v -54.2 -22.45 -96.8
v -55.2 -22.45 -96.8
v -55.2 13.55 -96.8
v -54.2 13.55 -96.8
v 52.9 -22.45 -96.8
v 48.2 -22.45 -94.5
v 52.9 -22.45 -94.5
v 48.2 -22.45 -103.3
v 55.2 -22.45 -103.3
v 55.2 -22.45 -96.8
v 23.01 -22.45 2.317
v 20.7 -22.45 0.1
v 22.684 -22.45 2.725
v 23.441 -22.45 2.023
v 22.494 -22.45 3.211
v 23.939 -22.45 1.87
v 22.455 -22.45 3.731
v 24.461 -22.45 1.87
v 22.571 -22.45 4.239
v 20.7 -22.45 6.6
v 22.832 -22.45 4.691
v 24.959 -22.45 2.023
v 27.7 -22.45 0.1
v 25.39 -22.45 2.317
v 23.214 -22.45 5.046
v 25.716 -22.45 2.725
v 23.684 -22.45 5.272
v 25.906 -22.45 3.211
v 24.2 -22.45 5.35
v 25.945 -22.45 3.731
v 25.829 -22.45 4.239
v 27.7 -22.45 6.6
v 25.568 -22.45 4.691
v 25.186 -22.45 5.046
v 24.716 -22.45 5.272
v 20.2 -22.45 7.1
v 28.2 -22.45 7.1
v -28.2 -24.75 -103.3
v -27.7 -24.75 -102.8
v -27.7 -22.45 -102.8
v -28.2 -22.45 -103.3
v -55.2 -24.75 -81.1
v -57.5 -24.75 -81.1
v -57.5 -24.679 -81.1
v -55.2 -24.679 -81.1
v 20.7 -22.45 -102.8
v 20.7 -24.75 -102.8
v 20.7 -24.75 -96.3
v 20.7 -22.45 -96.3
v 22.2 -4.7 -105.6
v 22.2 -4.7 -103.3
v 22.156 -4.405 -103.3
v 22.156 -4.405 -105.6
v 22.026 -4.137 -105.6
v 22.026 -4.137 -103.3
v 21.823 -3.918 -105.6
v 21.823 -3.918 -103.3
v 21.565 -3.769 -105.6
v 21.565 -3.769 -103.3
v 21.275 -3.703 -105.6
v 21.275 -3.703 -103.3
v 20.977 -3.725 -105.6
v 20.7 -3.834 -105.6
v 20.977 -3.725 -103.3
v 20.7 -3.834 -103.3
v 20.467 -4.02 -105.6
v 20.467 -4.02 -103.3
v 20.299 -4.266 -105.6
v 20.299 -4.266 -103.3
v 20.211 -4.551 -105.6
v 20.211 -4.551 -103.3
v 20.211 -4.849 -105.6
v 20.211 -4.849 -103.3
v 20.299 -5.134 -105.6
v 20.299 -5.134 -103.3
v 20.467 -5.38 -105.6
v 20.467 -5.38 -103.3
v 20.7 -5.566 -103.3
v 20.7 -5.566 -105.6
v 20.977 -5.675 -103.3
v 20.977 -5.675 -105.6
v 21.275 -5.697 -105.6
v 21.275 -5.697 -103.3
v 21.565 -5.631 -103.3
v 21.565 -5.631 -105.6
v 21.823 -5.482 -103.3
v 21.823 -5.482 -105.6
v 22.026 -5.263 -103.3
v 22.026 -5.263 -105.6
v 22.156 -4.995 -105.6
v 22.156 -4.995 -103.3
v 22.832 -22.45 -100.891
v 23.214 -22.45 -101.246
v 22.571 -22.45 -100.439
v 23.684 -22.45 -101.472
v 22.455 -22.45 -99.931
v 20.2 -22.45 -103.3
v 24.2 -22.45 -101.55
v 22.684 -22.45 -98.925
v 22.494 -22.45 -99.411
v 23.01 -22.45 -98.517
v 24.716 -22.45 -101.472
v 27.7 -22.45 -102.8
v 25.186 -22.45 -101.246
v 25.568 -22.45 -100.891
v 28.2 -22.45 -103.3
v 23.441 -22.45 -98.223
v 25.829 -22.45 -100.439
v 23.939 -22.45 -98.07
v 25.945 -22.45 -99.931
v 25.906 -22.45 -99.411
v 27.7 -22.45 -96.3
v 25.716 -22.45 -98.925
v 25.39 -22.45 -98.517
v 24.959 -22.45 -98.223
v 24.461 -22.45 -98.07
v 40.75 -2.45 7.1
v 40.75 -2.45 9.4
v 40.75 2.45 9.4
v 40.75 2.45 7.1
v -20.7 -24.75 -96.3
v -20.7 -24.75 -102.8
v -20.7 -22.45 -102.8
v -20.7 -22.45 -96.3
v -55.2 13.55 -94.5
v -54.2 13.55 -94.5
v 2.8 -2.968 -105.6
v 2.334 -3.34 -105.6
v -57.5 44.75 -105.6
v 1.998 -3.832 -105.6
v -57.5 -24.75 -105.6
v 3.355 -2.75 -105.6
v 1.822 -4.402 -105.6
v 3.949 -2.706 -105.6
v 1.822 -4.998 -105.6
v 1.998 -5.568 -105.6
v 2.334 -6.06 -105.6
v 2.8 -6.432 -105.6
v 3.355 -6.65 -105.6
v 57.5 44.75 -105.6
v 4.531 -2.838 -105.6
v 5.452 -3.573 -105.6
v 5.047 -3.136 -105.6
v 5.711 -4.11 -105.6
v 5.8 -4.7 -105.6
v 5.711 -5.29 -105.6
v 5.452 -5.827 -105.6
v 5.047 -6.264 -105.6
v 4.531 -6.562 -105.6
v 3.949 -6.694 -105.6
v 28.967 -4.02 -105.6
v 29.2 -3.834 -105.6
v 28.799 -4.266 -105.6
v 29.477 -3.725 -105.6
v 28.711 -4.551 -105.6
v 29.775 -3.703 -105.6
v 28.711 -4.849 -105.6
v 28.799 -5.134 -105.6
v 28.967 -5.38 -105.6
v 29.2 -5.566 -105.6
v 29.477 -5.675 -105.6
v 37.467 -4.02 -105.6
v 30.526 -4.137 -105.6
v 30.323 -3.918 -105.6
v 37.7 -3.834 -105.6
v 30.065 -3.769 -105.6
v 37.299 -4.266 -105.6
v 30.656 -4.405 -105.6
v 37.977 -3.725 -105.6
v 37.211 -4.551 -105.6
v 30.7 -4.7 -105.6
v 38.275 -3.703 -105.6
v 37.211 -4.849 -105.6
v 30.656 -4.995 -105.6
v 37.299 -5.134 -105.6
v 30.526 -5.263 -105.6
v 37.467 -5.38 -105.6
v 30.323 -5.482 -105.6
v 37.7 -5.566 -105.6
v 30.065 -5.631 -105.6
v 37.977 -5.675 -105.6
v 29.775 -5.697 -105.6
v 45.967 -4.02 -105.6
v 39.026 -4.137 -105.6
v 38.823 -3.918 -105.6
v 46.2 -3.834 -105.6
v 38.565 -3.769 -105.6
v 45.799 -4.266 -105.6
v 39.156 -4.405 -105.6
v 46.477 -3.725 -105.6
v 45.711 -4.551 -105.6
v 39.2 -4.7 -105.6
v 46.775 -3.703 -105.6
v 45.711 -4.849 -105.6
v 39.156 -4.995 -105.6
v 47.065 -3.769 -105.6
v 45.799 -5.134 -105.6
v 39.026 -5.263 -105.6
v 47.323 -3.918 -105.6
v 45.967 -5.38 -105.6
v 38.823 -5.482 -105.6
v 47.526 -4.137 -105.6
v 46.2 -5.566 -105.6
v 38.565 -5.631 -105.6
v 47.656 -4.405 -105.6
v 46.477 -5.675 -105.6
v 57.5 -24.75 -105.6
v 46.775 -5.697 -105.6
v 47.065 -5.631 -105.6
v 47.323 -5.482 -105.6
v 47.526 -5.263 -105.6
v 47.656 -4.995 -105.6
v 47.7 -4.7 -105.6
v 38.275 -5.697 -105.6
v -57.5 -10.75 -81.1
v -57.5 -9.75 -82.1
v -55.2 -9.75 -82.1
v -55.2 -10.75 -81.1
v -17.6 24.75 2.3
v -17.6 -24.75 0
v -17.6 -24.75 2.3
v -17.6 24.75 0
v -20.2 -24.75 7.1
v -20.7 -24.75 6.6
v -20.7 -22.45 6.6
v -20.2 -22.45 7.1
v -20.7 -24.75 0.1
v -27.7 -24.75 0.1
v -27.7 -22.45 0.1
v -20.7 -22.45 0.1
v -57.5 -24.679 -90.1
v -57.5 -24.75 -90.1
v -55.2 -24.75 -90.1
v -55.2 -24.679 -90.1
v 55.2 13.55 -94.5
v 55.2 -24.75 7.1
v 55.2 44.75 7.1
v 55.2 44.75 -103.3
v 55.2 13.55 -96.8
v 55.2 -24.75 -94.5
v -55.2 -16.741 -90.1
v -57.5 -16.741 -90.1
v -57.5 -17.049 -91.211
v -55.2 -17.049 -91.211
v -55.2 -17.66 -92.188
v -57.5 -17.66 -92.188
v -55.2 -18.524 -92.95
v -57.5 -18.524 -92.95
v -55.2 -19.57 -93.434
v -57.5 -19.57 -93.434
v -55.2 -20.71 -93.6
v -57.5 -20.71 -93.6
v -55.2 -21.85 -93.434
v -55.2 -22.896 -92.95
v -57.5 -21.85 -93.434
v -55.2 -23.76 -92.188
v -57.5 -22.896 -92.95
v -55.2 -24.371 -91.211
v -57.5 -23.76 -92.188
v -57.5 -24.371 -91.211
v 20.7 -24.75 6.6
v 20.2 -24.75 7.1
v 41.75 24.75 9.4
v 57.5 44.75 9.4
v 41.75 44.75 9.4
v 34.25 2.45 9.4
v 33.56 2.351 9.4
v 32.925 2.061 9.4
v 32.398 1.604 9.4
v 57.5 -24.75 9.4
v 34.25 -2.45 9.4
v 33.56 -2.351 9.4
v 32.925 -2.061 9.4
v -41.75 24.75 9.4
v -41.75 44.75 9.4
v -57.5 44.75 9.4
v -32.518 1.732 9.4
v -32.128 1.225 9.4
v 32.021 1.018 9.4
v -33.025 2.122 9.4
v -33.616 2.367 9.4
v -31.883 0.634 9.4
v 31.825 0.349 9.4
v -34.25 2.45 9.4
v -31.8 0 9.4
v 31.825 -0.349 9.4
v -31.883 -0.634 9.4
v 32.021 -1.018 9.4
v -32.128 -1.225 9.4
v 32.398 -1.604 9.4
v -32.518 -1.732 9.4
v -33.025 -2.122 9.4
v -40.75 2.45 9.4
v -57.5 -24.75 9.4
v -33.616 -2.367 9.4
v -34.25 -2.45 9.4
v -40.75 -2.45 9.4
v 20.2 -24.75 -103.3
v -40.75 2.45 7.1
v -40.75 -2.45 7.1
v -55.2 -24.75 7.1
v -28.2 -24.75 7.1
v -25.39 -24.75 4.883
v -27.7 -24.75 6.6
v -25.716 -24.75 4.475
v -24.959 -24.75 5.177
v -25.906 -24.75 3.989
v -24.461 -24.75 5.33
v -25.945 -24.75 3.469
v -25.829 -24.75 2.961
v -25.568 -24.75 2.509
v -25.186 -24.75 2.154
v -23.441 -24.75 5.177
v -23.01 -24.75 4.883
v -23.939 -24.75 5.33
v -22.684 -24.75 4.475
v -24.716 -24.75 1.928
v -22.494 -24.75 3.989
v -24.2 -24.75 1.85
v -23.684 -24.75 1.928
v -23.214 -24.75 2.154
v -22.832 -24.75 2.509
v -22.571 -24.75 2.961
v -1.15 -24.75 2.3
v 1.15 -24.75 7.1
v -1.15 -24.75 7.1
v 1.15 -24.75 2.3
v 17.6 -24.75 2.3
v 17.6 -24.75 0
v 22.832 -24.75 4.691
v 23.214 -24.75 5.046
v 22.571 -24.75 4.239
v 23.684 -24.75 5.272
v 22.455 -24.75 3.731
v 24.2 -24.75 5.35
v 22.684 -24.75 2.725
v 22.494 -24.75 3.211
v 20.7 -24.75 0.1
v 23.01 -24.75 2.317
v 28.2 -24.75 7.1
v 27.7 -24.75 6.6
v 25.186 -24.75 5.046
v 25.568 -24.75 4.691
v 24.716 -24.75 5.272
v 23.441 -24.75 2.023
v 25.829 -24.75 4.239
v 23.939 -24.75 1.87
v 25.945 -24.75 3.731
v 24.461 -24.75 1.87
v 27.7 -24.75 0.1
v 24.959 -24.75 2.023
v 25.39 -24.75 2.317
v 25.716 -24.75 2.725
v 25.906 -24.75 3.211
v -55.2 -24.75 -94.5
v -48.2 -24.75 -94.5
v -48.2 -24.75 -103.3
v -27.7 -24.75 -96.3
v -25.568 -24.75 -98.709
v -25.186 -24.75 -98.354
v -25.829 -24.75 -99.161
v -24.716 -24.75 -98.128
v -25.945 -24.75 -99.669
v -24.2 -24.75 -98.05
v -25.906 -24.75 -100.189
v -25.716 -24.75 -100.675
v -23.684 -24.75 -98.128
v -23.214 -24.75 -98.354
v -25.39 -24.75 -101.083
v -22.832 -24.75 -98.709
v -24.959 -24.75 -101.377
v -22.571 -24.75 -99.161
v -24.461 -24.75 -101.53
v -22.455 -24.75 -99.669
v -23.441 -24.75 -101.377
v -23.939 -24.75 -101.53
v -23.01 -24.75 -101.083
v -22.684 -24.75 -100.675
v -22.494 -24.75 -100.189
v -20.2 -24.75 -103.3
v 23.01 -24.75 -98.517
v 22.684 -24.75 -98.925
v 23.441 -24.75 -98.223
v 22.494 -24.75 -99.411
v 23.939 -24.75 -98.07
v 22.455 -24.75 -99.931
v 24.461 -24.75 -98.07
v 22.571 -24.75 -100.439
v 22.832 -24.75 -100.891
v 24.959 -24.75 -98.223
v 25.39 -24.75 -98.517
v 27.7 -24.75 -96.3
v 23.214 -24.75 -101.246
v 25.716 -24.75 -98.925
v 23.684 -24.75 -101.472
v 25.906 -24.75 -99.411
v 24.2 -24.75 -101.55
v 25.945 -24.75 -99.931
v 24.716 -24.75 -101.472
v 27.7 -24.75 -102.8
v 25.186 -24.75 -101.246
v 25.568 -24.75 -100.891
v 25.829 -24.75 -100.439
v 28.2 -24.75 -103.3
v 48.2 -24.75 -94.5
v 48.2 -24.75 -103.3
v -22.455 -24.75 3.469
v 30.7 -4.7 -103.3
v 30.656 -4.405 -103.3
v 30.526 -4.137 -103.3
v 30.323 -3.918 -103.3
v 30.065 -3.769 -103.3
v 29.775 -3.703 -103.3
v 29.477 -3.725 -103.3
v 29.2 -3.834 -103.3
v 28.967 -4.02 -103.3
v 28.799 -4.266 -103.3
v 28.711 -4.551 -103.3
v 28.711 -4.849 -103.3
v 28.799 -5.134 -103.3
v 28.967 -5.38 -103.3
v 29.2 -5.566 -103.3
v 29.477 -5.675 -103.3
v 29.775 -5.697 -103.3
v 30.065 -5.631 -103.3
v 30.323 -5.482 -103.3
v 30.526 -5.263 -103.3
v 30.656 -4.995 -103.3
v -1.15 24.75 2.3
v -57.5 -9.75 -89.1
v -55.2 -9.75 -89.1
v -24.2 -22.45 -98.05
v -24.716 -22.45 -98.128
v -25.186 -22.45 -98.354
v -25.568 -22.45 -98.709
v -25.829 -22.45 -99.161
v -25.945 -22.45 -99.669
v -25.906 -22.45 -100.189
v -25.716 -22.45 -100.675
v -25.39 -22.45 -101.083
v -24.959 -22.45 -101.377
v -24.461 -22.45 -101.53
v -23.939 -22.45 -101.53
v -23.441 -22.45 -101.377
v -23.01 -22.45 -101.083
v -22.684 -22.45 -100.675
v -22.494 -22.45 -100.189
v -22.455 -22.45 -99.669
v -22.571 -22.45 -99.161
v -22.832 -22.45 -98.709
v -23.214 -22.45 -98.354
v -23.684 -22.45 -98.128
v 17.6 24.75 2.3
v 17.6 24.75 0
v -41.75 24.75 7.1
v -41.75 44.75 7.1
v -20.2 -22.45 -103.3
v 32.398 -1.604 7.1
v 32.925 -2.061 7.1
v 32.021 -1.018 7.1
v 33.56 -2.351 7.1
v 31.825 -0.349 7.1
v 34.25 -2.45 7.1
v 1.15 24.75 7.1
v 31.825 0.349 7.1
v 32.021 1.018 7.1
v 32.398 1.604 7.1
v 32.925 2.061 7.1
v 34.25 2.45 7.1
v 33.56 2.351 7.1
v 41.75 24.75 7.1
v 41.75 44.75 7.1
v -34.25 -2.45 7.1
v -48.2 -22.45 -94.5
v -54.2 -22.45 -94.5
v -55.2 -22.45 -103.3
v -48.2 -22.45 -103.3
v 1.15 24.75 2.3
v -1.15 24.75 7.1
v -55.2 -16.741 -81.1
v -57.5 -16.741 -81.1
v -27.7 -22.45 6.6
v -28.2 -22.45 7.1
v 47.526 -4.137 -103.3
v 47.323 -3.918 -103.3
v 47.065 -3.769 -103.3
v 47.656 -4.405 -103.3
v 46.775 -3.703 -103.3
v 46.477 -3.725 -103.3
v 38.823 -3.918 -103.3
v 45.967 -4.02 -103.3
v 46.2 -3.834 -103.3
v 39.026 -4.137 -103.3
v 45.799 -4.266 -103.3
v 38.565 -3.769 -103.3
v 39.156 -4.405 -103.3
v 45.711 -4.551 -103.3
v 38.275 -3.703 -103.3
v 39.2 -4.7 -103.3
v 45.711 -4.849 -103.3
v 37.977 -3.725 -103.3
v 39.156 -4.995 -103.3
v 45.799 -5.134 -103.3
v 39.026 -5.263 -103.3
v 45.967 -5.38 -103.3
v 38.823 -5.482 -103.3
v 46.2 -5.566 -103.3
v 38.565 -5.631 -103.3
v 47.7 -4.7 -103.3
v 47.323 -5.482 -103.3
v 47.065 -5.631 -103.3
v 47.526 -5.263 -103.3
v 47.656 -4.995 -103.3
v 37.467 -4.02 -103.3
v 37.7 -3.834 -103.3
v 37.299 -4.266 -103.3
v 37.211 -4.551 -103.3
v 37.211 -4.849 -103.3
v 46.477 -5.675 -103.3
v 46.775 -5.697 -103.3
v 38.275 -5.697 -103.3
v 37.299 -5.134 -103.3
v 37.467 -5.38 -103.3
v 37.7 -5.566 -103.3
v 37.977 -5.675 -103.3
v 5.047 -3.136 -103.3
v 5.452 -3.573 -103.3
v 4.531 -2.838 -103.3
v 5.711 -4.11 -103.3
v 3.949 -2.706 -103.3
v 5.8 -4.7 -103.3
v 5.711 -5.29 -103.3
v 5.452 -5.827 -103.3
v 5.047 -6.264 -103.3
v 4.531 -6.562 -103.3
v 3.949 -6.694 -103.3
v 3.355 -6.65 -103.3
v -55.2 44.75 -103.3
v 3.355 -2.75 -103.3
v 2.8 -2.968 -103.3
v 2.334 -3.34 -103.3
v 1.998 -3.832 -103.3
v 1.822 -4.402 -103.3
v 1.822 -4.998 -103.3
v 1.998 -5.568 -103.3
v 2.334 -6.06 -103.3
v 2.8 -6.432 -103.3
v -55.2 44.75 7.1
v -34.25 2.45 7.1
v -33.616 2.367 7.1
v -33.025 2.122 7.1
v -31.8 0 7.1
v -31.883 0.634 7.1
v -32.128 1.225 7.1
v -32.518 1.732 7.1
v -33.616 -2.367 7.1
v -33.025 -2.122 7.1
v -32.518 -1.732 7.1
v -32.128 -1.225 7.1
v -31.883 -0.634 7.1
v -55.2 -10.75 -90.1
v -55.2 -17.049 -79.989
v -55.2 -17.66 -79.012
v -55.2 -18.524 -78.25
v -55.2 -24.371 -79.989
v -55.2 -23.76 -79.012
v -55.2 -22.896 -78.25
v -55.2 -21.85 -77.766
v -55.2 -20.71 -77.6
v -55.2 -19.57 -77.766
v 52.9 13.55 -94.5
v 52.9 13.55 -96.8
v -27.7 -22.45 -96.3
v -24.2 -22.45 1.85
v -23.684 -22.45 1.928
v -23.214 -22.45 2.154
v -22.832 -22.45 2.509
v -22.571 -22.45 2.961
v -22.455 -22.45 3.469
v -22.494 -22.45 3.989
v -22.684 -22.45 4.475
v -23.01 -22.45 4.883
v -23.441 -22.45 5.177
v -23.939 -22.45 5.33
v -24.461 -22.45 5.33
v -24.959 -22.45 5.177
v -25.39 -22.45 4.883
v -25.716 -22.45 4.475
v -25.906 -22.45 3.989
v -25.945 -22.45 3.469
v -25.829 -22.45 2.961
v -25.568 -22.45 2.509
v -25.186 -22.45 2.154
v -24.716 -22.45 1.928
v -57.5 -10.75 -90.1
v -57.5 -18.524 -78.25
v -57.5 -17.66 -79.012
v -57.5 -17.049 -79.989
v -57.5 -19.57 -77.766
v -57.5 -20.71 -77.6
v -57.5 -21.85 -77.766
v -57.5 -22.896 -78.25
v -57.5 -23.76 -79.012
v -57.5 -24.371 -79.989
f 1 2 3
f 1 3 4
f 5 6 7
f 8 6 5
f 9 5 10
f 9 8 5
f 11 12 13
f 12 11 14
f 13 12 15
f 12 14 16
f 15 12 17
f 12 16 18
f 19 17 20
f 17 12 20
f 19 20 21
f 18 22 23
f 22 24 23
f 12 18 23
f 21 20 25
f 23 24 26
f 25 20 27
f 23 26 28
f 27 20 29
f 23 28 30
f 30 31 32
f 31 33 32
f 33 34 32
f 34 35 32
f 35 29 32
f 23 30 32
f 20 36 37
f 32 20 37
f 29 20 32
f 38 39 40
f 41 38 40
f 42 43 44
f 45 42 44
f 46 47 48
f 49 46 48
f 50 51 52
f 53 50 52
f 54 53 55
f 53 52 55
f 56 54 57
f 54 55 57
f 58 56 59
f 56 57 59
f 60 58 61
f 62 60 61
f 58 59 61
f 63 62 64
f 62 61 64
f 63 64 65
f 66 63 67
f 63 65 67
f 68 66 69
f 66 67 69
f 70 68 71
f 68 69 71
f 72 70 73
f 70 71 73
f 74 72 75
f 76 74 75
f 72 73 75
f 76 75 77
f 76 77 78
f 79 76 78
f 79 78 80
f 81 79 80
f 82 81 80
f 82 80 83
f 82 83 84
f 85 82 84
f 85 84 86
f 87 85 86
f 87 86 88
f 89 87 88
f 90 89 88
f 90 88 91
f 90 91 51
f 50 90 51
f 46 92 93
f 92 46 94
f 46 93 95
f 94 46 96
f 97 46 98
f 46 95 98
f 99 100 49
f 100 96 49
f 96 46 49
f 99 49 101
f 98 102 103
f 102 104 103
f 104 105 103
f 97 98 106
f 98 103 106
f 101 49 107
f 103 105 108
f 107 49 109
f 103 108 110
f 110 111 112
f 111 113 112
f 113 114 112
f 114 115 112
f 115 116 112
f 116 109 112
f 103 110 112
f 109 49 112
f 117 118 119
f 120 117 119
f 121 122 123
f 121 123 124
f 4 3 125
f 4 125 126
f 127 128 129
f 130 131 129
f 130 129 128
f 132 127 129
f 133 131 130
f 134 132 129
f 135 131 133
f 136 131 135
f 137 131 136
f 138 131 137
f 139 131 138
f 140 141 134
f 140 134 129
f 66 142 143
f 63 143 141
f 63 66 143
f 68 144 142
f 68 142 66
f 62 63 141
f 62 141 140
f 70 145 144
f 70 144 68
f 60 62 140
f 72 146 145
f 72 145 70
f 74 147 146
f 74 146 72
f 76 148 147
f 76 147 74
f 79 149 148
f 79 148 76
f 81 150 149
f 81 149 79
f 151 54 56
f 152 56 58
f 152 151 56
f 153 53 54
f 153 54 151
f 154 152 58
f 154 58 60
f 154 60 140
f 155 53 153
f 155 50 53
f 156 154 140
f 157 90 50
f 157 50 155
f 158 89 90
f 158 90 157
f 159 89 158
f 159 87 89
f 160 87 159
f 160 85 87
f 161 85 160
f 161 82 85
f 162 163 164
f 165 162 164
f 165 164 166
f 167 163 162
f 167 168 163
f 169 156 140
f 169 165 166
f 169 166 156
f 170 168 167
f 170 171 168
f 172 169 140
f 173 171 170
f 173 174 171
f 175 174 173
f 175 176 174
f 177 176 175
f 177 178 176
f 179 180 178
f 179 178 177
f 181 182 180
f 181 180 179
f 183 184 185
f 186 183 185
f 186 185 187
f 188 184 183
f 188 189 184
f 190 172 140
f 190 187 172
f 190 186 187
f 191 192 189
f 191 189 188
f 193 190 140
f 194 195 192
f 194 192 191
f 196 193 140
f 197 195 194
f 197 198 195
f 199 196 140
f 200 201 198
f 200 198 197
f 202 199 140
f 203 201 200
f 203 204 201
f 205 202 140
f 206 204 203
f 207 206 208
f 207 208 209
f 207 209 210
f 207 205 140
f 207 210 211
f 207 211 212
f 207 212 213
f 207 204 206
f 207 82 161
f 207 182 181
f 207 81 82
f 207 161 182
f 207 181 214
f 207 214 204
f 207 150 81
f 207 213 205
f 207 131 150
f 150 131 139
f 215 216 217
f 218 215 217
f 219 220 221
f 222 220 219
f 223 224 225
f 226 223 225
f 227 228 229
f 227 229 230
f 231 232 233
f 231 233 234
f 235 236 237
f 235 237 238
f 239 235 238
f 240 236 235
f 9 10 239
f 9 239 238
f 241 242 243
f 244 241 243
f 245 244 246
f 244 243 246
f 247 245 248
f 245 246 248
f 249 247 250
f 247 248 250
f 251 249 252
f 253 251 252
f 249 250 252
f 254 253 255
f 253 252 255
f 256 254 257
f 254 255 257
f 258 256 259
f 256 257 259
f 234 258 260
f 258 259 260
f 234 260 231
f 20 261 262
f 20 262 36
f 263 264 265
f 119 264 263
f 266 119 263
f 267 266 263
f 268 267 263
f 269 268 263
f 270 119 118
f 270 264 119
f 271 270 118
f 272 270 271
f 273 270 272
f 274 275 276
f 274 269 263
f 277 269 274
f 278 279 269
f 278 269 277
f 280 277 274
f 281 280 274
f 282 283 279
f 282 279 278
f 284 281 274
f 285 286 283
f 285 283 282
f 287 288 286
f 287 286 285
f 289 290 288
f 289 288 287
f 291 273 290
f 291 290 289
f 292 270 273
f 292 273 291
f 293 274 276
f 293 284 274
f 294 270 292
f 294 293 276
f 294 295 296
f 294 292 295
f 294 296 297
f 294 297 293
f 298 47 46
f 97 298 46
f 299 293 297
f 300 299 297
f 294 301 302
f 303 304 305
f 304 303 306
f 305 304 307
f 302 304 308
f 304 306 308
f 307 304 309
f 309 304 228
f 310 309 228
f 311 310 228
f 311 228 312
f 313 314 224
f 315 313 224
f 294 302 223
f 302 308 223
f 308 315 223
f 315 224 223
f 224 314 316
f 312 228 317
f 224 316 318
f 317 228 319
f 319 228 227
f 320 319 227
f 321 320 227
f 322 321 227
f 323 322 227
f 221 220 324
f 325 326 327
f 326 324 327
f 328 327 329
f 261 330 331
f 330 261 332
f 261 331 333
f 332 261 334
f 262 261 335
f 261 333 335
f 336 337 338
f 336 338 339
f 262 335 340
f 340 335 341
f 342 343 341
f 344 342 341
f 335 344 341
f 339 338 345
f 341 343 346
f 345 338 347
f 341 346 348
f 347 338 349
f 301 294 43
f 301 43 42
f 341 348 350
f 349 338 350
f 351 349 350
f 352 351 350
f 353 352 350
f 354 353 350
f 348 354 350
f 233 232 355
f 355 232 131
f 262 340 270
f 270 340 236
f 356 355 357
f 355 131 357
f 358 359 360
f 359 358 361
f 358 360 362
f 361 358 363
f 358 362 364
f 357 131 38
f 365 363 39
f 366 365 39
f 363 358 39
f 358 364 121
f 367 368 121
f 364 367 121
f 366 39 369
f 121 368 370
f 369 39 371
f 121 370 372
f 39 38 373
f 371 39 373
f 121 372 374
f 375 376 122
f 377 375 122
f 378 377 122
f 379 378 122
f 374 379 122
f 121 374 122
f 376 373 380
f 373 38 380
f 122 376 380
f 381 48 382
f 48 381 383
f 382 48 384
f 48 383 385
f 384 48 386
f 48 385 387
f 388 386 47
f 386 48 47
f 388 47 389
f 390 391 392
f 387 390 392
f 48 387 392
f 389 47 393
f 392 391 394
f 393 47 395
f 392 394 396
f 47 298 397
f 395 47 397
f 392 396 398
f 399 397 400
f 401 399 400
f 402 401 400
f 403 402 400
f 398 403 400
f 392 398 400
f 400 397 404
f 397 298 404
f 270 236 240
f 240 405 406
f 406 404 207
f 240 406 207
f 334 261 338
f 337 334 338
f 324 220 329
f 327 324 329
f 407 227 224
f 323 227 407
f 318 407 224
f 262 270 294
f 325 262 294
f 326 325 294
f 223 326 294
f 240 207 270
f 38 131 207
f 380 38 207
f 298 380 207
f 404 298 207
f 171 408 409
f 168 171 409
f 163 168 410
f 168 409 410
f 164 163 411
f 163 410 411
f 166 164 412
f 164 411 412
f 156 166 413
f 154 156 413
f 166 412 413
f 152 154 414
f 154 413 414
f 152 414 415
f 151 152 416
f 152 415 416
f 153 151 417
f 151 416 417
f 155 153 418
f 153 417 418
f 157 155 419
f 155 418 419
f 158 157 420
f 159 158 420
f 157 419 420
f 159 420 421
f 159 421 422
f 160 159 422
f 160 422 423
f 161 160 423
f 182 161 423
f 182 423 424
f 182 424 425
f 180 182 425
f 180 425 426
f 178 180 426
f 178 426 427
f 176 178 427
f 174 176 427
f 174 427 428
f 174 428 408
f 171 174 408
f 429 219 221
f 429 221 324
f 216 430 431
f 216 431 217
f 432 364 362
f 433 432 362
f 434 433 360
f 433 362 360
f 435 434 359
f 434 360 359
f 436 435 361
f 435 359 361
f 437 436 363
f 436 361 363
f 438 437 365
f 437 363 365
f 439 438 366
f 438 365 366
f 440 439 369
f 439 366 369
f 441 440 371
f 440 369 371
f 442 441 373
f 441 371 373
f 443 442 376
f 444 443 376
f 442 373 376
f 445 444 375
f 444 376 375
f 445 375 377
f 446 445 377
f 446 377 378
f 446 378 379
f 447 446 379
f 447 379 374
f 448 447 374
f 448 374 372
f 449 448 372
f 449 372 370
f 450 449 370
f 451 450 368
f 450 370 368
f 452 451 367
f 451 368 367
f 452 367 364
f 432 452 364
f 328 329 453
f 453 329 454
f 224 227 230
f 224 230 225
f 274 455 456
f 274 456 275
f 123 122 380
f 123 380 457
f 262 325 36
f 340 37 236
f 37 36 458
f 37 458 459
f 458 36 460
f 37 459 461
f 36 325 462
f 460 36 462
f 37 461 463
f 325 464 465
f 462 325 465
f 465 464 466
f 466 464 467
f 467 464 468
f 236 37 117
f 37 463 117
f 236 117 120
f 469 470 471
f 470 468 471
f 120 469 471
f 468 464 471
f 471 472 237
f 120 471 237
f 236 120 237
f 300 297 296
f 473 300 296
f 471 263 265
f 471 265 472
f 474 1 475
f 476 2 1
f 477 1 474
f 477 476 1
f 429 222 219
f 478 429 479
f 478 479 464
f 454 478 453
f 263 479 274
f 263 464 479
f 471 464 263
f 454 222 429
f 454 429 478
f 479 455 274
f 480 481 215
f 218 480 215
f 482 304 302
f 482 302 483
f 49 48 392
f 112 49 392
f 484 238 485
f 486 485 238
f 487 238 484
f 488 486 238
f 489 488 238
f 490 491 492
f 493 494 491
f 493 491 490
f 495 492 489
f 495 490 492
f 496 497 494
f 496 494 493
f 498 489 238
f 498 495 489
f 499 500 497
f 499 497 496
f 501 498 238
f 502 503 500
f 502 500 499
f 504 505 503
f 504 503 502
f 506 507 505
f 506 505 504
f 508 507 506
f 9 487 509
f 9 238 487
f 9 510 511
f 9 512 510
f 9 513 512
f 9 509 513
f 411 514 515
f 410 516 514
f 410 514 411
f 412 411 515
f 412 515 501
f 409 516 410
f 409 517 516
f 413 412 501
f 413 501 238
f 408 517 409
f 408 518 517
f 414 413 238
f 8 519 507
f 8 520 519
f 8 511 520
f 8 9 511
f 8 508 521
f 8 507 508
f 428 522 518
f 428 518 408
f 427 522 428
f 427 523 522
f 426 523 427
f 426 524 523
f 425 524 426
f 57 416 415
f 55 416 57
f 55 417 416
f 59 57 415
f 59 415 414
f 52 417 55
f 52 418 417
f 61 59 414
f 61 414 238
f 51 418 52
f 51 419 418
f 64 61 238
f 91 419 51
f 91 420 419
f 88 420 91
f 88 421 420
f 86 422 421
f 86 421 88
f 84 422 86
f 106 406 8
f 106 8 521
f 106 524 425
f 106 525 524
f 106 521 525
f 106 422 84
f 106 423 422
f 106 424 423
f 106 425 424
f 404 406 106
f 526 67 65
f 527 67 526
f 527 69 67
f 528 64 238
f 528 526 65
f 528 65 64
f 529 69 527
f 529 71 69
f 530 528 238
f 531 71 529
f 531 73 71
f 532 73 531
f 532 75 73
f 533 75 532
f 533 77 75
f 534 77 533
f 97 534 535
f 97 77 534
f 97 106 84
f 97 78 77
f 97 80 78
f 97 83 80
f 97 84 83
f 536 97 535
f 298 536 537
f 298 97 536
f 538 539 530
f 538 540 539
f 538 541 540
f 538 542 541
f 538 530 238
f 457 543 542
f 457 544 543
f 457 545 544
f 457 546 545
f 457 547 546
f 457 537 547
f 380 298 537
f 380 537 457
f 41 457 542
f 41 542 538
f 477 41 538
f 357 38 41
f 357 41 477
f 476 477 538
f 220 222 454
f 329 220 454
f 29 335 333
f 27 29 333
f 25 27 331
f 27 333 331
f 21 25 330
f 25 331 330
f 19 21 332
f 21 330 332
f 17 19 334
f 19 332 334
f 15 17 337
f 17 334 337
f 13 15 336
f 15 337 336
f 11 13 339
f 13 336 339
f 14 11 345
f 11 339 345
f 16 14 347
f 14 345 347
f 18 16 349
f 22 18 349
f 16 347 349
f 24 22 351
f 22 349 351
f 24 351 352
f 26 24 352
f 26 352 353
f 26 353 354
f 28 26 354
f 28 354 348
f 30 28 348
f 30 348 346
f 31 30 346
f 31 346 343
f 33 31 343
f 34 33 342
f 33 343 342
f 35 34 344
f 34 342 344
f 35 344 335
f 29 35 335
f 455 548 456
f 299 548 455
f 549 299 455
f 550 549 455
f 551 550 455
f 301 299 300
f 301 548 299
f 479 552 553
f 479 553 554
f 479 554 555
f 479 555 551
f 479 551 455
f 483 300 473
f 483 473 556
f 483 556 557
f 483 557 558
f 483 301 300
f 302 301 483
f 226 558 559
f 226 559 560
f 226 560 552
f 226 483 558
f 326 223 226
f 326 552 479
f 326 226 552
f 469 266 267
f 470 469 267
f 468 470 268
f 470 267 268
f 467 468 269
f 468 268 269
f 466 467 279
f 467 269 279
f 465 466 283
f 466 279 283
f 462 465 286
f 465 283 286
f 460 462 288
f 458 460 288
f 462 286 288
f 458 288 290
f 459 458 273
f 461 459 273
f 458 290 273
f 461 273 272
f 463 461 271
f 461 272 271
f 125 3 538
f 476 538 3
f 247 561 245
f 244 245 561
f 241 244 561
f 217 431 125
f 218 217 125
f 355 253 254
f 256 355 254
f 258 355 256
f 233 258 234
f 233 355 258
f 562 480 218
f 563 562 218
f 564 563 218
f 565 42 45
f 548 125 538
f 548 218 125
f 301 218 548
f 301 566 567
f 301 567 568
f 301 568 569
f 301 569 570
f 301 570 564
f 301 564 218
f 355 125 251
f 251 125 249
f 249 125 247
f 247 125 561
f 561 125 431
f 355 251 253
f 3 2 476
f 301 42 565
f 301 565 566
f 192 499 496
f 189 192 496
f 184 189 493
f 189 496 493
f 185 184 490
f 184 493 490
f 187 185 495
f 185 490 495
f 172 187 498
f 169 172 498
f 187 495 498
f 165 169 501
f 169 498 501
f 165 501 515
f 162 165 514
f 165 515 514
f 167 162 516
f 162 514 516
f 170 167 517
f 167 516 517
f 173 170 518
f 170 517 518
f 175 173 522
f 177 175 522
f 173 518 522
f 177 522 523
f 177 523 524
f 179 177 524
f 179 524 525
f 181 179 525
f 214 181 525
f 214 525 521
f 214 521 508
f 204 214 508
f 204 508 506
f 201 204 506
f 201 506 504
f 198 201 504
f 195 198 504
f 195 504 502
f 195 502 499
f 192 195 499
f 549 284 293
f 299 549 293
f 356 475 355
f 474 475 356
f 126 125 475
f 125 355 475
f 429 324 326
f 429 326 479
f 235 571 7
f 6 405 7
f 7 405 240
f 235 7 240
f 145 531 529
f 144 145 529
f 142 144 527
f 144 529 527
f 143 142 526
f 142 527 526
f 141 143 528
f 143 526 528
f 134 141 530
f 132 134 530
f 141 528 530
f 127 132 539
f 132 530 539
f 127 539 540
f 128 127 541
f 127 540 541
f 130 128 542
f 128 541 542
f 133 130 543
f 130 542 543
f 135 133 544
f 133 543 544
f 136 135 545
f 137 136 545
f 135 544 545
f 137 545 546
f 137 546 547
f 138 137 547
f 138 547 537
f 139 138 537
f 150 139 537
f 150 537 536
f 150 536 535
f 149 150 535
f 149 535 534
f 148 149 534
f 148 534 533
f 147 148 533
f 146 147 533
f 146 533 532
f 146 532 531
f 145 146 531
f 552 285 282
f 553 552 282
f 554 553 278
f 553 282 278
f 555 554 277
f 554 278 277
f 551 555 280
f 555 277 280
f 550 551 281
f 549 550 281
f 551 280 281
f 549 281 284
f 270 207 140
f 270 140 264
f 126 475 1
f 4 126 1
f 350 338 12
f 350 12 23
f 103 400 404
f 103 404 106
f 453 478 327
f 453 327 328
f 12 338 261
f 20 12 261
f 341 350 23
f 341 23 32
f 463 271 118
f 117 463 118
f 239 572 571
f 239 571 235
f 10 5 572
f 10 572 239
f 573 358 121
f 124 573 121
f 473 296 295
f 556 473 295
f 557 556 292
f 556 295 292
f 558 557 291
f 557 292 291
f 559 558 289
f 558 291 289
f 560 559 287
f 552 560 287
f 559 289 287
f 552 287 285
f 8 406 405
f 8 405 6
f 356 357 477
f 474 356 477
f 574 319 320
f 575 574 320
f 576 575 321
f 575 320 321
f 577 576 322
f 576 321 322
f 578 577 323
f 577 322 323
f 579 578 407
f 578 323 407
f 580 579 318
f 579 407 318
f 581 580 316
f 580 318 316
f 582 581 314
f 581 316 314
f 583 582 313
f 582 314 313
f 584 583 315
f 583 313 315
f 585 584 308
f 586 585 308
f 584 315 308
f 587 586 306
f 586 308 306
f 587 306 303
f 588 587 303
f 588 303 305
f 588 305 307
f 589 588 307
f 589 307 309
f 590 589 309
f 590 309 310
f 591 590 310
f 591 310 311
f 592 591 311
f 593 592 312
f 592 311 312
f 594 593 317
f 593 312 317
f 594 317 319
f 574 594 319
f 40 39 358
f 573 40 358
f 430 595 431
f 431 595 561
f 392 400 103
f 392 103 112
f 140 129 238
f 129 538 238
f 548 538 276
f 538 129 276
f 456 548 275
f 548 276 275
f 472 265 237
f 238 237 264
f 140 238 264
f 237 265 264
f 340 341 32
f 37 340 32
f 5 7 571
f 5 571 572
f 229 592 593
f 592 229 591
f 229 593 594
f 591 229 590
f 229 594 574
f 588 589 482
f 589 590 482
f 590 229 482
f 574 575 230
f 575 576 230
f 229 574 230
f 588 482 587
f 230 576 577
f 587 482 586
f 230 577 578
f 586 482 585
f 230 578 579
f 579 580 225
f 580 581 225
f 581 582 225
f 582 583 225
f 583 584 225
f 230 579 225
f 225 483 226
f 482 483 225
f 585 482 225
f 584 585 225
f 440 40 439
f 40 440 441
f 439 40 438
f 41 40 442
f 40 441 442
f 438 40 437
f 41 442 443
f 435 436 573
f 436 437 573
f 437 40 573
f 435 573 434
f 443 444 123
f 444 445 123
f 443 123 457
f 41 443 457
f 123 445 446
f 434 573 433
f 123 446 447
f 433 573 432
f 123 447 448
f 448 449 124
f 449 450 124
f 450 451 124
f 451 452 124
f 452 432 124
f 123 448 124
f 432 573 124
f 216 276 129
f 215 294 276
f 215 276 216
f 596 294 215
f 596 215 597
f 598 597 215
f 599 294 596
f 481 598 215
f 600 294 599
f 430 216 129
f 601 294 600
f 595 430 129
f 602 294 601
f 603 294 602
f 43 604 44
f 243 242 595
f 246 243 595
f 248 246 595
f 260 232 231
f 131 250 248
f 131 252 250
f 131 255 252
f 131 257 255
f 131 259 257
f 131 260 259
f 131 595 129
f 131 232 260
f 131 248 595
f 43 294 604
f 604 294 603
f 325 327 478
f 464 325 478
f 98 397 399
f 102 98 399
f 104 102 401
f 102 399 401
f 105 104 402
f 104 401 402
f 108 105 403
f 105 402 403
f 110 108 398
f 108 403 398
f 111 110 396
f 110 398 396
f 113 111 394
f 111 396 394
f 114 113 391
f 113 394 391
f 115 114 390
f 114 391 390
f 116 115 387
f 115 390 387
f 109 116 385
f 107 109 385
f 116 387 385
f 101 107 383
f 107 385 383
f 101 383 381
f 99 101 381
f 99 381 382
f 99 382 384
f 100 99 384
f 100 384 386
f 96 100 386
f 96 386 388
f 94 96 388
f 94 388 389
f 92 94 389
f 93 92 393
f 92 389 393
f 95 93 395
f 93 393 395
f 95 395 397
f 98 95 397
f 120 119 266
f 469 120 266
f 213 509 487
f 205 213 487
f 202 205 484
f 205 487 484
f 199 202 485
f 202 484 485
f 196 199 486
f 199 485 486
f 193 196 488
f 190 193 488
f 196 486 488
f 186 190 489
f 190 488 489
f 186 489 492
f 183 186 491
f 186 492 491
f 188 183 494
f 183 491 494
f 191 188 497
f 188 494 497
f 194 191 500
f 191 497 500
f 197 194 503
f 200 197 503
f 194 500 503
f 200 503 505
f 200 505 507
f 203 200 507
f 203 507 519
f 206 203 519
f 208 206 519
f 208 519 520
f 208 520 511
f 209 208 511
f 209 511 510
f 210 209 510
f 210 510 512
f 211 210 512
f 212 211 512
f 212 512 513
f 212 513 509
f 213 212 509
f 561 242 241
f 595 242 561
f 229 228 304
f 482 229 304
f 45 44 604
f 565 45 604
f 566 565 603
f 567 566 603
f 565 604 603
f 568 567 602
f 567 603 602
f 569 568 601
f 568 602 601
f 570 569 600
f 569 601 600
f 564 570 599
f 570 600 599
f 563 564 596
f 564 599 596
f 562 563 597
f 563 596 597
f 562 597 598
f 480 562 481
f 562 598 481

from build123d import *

# Parameters (mm, degrees)
SKETCH1_W            = 35.2
SKETCH1_H            = 49.5
BOSS_EXTRUDE1_DEPTH  = 2.3
SKETCH2_W            = 2.3
SKETCH2_H            = 49.5
BOSS_EXTRUDE2_DEPTH  = 4.8
SKETCH3_W            = 83.5
SKETCH3_H            = 49.5
BOSS_EXTRUDE3_DEPTH  = 2.3
CUT_EXTRUDE1_DEPTH   = 50.436676668
BOSS_EXTRUDE10_DEPTH = 69.5
SKETCH7_W            = 7
SKETCH7_H            = 7
SKETCH7_R            = 1.75
BOSS_EXTRUDE7_DEPTH  = 2.3
CHAMFER1_SIZE        = 0.5
SKETCH12_W           = 7
SKETCH12_H           = 2.3
BOSS_EXTRUDE11_DEPTH = 8.8
SKETCH13_W           = 2.3
SKETCH13_H           = 2.3
SKETCH13_W_2         = 1
BOSS_EXTRUDE12_DEPTH = 36
SKETCH14_R           = 1
SKETCH14_R_2         = 2
CUT_EXTRUDE3_DEPTH   = 135.201723163
CUT_EXTRUDE4_REACH   = 164.416
SKETCH18_R           = 4
SKETCH18_W           = 9
SKETCH18_H           = 15
CHAMFER2_SIZE        = 1


with BuildPart() as part:
    # Sketch1 → Boss-Extrude1 (new body)
    with BuildSketch(Plane.XY):
        Rectangle(SKETCH1_W, SKETCH1_H)
    extrude(amount=BOSS_EXTRUDE1_DEPTH)

    # Sketch2 → Boss-Extrude2 (add)
    with BuildSketch(Plane.XY.offset(2.3)):
        Rectangle(SKETCH2_W, SKETCH2_H)
    extrude(amount=BOSS_EXTRUDE2_DEPTH)

    # Sketch3 → Boss-Extrude3 (add)
    with BuildSketch(Plane.XY.offset(7.1)):
        Rectangle(SKETCH3_W, SKETCH3_H)
    extrude(amount=BOSS_EXTRUDE3_DEPTH)

    # Sketch4 → Cut-Extrude1 (cut, through all)
    with BuildSketch(Plane.XY.offset(9.4)):
        with BuildLine():
            Line((-34.25, 2.45), (-40.75, 2.45))
            Line((-40.75, 2.45), (-40.75, -2.45))
            Line((-40.75, -2.45), (-34.25, -2.45))
            ThreePointArc((-34.25, -2.45), (-36.7, 0), (-34.25, 2.45))
        make_face()
        with BuildLine():
            ThreePointArc((-31.8, 0), (-32.517588386, 1.732411614), (-34.25, 2.45))
            Line((-34.25, 2.45), (-34.25, -2.45))
            ThreePointArc((-34.25, -2.45), (-32.517588386, -1.732411614), (-31.8, 0))
        make_face()
        with BuildLine():
            Line((-34.25, -2.45), (-34.25, 2.45))
            ThreePointArc((-34.25, 2.45), (-36.7, 0), (-34.25, -2.45))
        make_face()
        with BuildLine():
            ThreePointArc((34.25, 2.45), (31.8, 0), (34.25, -2.45))
            Line((34.25, -2.45), (34.25, 2.45))
        make_face()
        with BuildLine():
            Line((34.25, 2.45), (34.25, -2.45))
            ThreePointArc((34.25, -2.45), (35.982411614, -1.732411614), (36.7, 0))
            ThreePointArc((36.7, 0), (35.982411614, 1.732411614), (34.25, 2.45))
        make_face()
        with BuildLine():
            Line((34.25, -2.45), (40.75, -2.45))
            Line((40.75, -2.45), (40.75, 2.45))
            Line((40.75, 2.45), (34.25, 2.45))
            ThreePointArc((34.25, 2.45), (35.982411614, 1.732411614), (36.7, 0))
            ThreePointArc((36.7, 0), (35.982411614, -1.732411614), (34.25, -2.45))
        make_face()
    extrude(amount=-CUT_EXTRUDE1_DEPTH, mode=Mode.SUBTRACT)

    # Sketch10 → Boss-Extrude10 (add)
    with BuildSketch(Plane.XZ.offset(24.75)):
        Polygon((-41.75, 7.1), (-41.75, 9.4), (-57.5, 9.4), (-57.5, -105.6), (57.5, -105.6), (57.5, 9.4), (41.75, 9.4), (41.75, 7.1), (55.2, 7.1), (55.2, -103.3), (-55.2, -103.3), (-55.2, 7.1), align=None)
    extrude(amount=-BOSS_EXTRUDE10_DEPTH)

    # Sketch7 → Boss-Extrude7 (add)
    with BuildSketch(Plane.XZ.offset(24.75)):
        with Locations((-24.2, 3.6)):
            Rectangle(SKETCH7_W, SKETCH7_H)
        with Locations(Location((-24.2, 3.6, 0), (0, 0, 270))):
            Circle(SKETCH7_R, mode=Mode.SUBTRACT)
        with Locations((24.2, 3.6)):
            Rectangle(SKETCH7_W, SKETCH7_H)
        with Locations(Location((24.2, 3.6, 0), (0, 0, 90))):
            Circle(SKETCH7_R, mode=Mode.SUBTRACT)
        with Locations((24.2, -99.8)):
            Rectangle(SKETCH7_W, SKETCH7_H)
        with Locations(Location((24.2, -99.8, 0), (0, 0, 270))):
            Circle(SKETCH7_R, mode=Mode.SUBTRACT)
        with Locations((-24.2, -99.8)):
            Rectangle(SKETCH7_W, SKETCH7_H)
        with Locations(Location((-24.2, -99.8, 0), (0, 0, 90))):
            Circle(SKETCH7_R, mode=Mode.SUBTRACT)
    extrude(amount=-BOSS_EXTRUDE7_DEPTH)

    # Chamfer1
    chamfer1_edges = [part.edges().sort_by_distance(p)[0] for p in [
        (-27.7, -23.6, 7.1),
        (-20.7, -23.6, 7.1),
        (27.7, -23.6, 7.1),
        (20.7, -23.6, 7.1),
        (27.7, -23.6, -103.3),
        (20.7, -23.6, -103.3),
        (-27.7, -23.6, -103.3),
        (-20.7, -23.6, -103.3),
    ]]
    chamfer(chamfer1_edges, length=CHAMFER1_SIZE)

    # Sketch12 → Boss-Extrude11 (add)
    with BuildSketch(Plane.XY.offset(-103.3)):
        with Locations((51.7, -23.6)):
            Rectangle(SKETCH12_W, SKETCH12_H)
        with Locations((-51.7, -23.6)):
            Rectangle(SKETCH12_W, SKETCH12_H)
    extrude(amount=BOSS_EXTRUDE11_DEPTH)

    # Sketch13 → Boss-Extrude12 (add)
    with BuildSketch(Plane(origin=(0, -22.45, 0), x_dir=(1, 0, 0), z_dir=(0, 1, 0))):
        with Locations((54.05, 95.65)):
            Rectangle(SKETCH13_W, SKETCH13_H)
        with Locations((-54.7, 95.65)):
            Rectangle(SKETCH13_W_2, SKETCH13_H)
    extrude(amount=BOSS_EXTRUDE12_DEPTH)

    # Sketch14 → Cut-Extrude3 (cut, through all)
    with BuildSketch(Plane.XY.offset(-103.3)):
        with Locations((46.7, -4.7)):
            Circle(SKETCH14_R)
        with Locations((38.2, -4.7)):
            Circle(SKETCH14_R)
        with Locations((29.7, -4.7)):
            Circle(SKETCH14_R)
        with Locations((21.2, -4.7)):
            Circle(SKETCH14_R)
        with Locations((3.8, -4.7)):
            Circle(SKETCH14_R_2)
    extrude(amount=-CUT_EXTRUDE3_DEPTH, mode=Mode.SUBTRACT)

    # Sketch18 → Cut-Extrude4 (cut, up to next)
    with BuildSketch(Plane.ZY.offset(57.5), mode=Mode.PRIVATE) as cut_extrude4_sk1:
        with Locations((-89.6, -20.71)):
            Circle(SKETCH18_R)
    cut_extrude4_tool1 = extrude(cut_extrude4_sk1.sketch, amount=-CUT_EXTRUDE4_REACH, mode=Mode.PRIVATE) & part.part
    # Sketch18 → Cut-Extrude4 (cut, up to next)
    with BuildSketch(Plane.ZY.offset(57.5), mode=Mode.PRIVATE) as cut_extrude4_sk2:
        with Locations((-81.6, -20.71)):
            Circle(SKETCH18_R)
    cut_extrude4_tool2 = extrude(cut_extrude4_sk2.sketch, amount=-CUT_EXTRUDE4_REACH, mode=Mode.PRIVATE) & part.part
    # Sketch18 → Cut-Extrude4 (cut, up to next)
    with BuildSketch(Plane.ZY.offset(57.5), mode=Mode.PRIVATE) as cut_extrude4_sk3:
        with Locations((-85.6, -17.25)):
            Rectangle(SKETCH18_W, SKETCH18_H)
    cut_extrude4_tool3 = extrude(cut_extrude4_sk3.sketch, amount=-CUT_EXTRUDE4_REACH, mode=Mode.PRIVATE) & part.part
    add(cut_extrude4_tool1.solids().sort_by_distance((-57.5, -20.71, -89.6))[0], mode=Mode.SUBTRACT)
    add(cut_extrude4_tool2.solids().sort_by_distance((-57.5, -20.71, -81.6))[0], mode=Mode.SUBTRACT)
    add(cut_extrude4_tool3.solids().sort_by_distance((-57.5, -17.25, -85.6))[0], mode=Mode.SUBTRACT)

    # Chamfer2
    chamfer2_edges = [part.edges().sort_by_distance(p)[0] for p in [
        (-56.35, -9.75, -81.1),
        (-56.35, -9.75, -90.1),
    ]]
    chamfer(chamfer2_edges, length=CHAMFER2_SIZE)


solid = part.part
